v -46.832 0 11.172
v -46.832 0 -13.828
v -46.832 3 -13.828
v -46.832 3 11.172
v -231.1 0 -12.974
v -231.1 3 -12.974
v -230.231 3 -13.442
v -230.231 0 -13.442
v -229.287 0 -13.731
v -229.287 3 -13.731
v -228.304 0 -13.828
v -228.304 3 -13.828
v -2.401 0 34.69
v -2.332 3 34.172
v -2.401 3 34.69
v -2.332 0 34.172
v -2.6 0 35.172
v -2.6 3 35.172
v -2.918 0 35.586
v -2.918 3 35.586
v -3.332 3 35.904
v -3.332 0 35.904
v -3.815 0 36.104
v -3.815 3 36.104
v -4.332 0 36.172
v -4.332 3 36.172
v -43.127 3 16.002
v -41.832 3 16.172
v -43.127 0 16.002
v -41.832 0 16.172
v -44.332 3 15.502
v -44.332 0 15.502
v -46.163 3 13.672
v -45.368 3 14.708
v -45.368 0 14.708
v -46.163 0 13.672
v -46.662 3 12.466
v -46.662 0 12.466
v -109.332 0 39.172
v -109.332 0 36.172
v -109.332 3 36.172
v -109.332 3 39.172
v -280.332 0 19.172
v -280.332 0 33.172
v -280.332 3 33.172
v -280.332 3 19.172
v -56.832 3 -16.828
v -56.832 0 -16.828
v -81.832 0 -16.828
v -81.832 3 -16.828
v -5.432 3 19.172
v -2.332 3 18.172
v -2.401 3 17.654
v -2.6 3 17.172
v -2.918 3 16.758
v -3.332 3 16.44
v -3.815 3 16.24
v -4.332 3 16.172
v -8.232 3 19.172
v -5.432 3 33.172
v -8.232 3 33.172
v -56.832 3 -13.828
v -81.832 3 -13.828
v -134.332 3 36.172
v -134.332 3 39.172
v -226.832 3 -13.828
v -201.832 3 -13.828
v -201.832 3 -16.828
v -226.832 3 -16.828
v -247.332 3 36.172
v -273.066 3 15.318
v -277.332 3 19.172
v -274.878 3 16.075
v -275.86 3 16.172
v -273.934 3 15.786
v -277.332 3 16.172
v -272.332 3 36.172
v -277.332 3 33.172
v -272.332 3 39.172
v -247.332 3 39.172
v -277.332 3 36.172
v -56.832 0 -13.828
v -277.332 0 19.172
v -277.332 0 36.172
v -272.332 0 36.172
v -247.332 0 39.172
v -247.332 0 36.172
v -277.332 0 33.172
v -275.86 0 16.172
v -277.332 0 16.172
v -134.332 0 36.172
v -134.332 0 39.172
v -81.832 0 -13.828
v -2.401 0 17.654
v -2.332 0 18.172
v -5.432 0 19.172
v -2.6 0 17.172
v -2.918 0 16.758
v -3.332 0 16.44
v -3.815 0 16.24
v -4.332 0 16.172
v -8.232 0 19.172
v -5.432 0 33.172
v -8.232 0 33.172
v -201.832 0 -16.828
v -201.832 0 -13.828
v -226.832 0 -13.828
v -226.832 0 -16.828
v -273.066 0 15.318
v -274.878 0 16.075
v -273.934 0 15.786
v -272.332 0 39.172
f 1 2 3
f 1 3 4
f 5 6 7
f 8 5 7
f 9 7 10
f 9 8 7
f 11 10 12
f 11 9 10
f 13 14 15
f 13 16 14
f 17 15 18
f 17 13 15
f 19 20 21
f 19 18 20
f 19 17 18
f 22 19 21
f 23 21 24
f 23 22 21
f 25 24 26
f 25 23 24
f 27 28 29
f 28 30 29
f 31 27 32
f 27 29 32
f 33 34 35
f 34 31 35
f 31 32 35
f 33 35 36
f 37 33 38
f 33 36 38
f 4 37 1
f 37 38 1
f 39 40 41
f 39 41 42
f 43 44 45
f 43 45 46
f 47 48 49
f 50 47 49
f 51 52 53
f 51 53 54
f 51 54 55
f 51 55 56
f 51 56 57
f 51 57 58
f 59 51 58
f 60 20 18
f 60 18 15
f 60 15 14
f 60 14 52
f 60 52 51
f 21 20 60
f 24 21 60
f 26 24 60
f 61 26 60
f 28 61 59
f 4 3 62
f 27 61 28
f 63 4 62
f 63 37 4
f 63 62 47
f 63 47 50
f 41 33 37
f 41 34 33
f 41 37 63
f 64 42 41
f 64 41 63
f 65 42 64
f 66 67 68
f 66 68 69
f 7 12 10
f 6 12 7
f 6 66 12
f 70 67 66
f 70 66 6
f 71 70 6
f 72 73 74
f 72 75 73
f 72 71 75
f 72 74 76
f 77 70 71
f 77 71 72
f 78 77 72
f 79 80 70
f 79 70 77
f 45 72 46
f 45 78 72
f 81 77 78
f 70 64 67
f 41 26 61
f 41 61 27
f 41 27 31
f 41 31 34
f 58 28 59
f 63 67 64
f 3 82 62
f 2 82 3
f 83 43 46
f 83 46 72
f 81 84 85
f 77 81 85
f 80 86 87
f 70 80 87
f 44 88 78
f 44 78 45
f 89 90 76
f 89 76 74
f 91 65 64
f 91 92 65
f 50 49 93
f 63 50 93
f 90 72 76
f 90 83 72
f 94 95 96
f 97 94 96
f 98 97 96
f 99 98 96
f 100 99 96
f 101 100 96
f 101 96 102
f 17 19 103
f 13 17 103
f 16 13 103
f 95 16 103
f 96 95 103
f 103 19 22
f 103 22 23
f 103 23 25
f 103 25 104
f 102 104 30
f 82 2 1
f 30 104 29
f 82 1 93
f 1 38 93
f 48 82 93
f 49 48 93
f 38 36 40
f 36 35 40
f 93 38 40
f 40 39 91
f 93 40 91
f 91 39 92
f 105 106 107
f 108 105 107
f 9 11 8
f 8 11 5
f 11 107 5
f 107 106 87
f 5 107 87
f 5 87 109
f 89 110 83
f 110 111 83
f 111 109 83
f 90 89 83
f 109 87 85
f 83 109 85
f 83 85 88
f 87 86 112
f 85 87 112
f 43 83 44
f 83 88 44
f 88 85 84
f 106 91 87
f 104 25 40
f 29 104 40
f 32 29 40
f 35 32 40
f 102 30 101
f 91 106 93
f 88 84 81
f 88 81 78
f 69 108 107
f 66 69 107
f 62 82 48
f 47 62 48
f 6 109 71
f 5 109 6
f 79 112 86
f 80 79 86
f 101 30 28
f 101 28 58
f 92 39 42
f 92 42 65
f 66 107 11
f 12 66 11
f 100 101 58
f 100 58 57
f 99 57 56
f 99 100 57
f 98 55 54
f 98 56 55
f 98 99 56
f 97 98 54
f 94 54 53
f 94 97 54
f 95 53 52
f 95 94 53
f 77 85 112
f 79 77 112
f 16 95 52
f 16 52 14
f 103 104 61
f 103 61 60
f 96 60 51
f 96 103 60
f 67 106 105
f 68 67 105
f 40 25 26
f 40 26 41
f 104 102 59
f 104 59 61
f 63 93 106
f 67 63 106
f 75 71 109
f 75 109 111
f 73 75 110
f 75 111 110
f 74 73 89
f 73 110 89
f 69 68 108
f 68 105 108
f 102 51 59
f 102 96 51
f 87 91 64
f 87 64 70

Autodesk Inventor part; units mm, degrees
ref_plane "YZ Plane" through (0, 0, 0) normal (1, 0, 0) x (0, 1, 0)
ref_plane "XZ Plane" through (0, 0, 0) normal (0, 1, 0) x (-1, 0, 0)
ref_plane "XY Plane" through (0, 0, 0) normal (0, 0, 1) x (1, 0, 0)
sketch "Sketch1" plane through (0, 0, 0) normal (0, 1, 0) x (-1, 0, 0)
  line L0 (4.3325, 36.172) -> (109.3325, 36.172)
  line L1 (134.3325, 36.172) -> (247.3325, 36.172)
  line L2 (277.3325, 36.172) -> (277.3325, 33.172)
  line L3 (277.3325, 33.172) -> (280.3325, 33.172)
  line L4 (280.3325, 33.172) -> (280.3325, 19.172)
  line L5 (280.3325, 19.172) -> (277.3325, 19.172)
  line L6 (277.3325, 19.172) -> (277.3325, 16.172)
  line L7 (201.8325, -13.828) -> (201.8325, -16.828)
  line L8 (201.8325, -16.828) -> (226.8325, -16.828)
  line L9 (226.8325, -16.828) -> (226.8325, -13.828)
  line L10 (56.8325, -13.828) -> (56.8325, -16.828)
  line L11 (56.8325, -16.828) -> (81.8325, -16.828)
  line L12 (81.8325, -16.828) -> (81.8325, -13.828)
  line L13 (81.8325, -13.828) -> (201.8325, -13.828)
  line L14 (56.8325, -13.828) -> (46.8325, -13.828)
  line L15 (46.8325, -13.828) -> (46.8325, 11.172)
  arc A0 (46.8325, 11.172) -> (41.8325, 16.172) centre (41.8325, 11.172) ccw
  line L16 (41.8325, 16.172) -> (4.3325, 16.172)
  arc A1 (2.3325, 18.172) -> (4.3325, 16.172) centre (4.3325, 18.172) ccw
  line L17 (2.3325, 18.172) -> (2.3325, 34.172)
  arc A2 (4.3325, 36.172) -> (2.3325, 34.172) centre (4.3325, 34.172) ccw
  line L18 (5.4325, 19.172) -> (8.2325, 19.172)
  line L19 (8.2325, 19.172) -> (8.2325, 33.172)
  line L20 (8.2325, 33.172) -> (5.4325, 33.172)
  line L21 (5.4325, 33.172) -> (5.4325, 19.172)
  line L22 (109.3325, 36.172) -> (109.3325, 39.172)
  line L23 (109.3325, 39.172) -> (134.3325, 39.172)
  line L24 (134.3325, 39.172) -> (134.3325, 36.172)
  line L25 (277.3325, 36.172) -> (272.3325, 36.172)
  line L26 (272.3325, 36.172) -> (272.3325, 39.172)
  line L27 (272.3325, 39.172) -> (247.3325, 39.172)
  line L28 (247.3325, 39.172) -> (247.3325, 36.172)
  line L29 (226.8325, -13.828) -> (228.3045, -13.828)
  line L30 (277.3325, 16.172) -> (275.8605, 16.172)
  arc A3 (275.8605, 16.172) -> (273.0655, 15.3179) centre (275.8605, 11.172) ccw
  line L31 (273.0655, 15.3179) -> (231.0995, -12.9739)
  arc A4 (228.3045, -13.828) -> (231.0995, -12.9739) centre (228.3045, -8.828) ccw
extrude "Extrusion1" add sketch "Sketch1" along normal blind 3
properties part number "sideWallRight" material "Polycarbonate, Clear"
